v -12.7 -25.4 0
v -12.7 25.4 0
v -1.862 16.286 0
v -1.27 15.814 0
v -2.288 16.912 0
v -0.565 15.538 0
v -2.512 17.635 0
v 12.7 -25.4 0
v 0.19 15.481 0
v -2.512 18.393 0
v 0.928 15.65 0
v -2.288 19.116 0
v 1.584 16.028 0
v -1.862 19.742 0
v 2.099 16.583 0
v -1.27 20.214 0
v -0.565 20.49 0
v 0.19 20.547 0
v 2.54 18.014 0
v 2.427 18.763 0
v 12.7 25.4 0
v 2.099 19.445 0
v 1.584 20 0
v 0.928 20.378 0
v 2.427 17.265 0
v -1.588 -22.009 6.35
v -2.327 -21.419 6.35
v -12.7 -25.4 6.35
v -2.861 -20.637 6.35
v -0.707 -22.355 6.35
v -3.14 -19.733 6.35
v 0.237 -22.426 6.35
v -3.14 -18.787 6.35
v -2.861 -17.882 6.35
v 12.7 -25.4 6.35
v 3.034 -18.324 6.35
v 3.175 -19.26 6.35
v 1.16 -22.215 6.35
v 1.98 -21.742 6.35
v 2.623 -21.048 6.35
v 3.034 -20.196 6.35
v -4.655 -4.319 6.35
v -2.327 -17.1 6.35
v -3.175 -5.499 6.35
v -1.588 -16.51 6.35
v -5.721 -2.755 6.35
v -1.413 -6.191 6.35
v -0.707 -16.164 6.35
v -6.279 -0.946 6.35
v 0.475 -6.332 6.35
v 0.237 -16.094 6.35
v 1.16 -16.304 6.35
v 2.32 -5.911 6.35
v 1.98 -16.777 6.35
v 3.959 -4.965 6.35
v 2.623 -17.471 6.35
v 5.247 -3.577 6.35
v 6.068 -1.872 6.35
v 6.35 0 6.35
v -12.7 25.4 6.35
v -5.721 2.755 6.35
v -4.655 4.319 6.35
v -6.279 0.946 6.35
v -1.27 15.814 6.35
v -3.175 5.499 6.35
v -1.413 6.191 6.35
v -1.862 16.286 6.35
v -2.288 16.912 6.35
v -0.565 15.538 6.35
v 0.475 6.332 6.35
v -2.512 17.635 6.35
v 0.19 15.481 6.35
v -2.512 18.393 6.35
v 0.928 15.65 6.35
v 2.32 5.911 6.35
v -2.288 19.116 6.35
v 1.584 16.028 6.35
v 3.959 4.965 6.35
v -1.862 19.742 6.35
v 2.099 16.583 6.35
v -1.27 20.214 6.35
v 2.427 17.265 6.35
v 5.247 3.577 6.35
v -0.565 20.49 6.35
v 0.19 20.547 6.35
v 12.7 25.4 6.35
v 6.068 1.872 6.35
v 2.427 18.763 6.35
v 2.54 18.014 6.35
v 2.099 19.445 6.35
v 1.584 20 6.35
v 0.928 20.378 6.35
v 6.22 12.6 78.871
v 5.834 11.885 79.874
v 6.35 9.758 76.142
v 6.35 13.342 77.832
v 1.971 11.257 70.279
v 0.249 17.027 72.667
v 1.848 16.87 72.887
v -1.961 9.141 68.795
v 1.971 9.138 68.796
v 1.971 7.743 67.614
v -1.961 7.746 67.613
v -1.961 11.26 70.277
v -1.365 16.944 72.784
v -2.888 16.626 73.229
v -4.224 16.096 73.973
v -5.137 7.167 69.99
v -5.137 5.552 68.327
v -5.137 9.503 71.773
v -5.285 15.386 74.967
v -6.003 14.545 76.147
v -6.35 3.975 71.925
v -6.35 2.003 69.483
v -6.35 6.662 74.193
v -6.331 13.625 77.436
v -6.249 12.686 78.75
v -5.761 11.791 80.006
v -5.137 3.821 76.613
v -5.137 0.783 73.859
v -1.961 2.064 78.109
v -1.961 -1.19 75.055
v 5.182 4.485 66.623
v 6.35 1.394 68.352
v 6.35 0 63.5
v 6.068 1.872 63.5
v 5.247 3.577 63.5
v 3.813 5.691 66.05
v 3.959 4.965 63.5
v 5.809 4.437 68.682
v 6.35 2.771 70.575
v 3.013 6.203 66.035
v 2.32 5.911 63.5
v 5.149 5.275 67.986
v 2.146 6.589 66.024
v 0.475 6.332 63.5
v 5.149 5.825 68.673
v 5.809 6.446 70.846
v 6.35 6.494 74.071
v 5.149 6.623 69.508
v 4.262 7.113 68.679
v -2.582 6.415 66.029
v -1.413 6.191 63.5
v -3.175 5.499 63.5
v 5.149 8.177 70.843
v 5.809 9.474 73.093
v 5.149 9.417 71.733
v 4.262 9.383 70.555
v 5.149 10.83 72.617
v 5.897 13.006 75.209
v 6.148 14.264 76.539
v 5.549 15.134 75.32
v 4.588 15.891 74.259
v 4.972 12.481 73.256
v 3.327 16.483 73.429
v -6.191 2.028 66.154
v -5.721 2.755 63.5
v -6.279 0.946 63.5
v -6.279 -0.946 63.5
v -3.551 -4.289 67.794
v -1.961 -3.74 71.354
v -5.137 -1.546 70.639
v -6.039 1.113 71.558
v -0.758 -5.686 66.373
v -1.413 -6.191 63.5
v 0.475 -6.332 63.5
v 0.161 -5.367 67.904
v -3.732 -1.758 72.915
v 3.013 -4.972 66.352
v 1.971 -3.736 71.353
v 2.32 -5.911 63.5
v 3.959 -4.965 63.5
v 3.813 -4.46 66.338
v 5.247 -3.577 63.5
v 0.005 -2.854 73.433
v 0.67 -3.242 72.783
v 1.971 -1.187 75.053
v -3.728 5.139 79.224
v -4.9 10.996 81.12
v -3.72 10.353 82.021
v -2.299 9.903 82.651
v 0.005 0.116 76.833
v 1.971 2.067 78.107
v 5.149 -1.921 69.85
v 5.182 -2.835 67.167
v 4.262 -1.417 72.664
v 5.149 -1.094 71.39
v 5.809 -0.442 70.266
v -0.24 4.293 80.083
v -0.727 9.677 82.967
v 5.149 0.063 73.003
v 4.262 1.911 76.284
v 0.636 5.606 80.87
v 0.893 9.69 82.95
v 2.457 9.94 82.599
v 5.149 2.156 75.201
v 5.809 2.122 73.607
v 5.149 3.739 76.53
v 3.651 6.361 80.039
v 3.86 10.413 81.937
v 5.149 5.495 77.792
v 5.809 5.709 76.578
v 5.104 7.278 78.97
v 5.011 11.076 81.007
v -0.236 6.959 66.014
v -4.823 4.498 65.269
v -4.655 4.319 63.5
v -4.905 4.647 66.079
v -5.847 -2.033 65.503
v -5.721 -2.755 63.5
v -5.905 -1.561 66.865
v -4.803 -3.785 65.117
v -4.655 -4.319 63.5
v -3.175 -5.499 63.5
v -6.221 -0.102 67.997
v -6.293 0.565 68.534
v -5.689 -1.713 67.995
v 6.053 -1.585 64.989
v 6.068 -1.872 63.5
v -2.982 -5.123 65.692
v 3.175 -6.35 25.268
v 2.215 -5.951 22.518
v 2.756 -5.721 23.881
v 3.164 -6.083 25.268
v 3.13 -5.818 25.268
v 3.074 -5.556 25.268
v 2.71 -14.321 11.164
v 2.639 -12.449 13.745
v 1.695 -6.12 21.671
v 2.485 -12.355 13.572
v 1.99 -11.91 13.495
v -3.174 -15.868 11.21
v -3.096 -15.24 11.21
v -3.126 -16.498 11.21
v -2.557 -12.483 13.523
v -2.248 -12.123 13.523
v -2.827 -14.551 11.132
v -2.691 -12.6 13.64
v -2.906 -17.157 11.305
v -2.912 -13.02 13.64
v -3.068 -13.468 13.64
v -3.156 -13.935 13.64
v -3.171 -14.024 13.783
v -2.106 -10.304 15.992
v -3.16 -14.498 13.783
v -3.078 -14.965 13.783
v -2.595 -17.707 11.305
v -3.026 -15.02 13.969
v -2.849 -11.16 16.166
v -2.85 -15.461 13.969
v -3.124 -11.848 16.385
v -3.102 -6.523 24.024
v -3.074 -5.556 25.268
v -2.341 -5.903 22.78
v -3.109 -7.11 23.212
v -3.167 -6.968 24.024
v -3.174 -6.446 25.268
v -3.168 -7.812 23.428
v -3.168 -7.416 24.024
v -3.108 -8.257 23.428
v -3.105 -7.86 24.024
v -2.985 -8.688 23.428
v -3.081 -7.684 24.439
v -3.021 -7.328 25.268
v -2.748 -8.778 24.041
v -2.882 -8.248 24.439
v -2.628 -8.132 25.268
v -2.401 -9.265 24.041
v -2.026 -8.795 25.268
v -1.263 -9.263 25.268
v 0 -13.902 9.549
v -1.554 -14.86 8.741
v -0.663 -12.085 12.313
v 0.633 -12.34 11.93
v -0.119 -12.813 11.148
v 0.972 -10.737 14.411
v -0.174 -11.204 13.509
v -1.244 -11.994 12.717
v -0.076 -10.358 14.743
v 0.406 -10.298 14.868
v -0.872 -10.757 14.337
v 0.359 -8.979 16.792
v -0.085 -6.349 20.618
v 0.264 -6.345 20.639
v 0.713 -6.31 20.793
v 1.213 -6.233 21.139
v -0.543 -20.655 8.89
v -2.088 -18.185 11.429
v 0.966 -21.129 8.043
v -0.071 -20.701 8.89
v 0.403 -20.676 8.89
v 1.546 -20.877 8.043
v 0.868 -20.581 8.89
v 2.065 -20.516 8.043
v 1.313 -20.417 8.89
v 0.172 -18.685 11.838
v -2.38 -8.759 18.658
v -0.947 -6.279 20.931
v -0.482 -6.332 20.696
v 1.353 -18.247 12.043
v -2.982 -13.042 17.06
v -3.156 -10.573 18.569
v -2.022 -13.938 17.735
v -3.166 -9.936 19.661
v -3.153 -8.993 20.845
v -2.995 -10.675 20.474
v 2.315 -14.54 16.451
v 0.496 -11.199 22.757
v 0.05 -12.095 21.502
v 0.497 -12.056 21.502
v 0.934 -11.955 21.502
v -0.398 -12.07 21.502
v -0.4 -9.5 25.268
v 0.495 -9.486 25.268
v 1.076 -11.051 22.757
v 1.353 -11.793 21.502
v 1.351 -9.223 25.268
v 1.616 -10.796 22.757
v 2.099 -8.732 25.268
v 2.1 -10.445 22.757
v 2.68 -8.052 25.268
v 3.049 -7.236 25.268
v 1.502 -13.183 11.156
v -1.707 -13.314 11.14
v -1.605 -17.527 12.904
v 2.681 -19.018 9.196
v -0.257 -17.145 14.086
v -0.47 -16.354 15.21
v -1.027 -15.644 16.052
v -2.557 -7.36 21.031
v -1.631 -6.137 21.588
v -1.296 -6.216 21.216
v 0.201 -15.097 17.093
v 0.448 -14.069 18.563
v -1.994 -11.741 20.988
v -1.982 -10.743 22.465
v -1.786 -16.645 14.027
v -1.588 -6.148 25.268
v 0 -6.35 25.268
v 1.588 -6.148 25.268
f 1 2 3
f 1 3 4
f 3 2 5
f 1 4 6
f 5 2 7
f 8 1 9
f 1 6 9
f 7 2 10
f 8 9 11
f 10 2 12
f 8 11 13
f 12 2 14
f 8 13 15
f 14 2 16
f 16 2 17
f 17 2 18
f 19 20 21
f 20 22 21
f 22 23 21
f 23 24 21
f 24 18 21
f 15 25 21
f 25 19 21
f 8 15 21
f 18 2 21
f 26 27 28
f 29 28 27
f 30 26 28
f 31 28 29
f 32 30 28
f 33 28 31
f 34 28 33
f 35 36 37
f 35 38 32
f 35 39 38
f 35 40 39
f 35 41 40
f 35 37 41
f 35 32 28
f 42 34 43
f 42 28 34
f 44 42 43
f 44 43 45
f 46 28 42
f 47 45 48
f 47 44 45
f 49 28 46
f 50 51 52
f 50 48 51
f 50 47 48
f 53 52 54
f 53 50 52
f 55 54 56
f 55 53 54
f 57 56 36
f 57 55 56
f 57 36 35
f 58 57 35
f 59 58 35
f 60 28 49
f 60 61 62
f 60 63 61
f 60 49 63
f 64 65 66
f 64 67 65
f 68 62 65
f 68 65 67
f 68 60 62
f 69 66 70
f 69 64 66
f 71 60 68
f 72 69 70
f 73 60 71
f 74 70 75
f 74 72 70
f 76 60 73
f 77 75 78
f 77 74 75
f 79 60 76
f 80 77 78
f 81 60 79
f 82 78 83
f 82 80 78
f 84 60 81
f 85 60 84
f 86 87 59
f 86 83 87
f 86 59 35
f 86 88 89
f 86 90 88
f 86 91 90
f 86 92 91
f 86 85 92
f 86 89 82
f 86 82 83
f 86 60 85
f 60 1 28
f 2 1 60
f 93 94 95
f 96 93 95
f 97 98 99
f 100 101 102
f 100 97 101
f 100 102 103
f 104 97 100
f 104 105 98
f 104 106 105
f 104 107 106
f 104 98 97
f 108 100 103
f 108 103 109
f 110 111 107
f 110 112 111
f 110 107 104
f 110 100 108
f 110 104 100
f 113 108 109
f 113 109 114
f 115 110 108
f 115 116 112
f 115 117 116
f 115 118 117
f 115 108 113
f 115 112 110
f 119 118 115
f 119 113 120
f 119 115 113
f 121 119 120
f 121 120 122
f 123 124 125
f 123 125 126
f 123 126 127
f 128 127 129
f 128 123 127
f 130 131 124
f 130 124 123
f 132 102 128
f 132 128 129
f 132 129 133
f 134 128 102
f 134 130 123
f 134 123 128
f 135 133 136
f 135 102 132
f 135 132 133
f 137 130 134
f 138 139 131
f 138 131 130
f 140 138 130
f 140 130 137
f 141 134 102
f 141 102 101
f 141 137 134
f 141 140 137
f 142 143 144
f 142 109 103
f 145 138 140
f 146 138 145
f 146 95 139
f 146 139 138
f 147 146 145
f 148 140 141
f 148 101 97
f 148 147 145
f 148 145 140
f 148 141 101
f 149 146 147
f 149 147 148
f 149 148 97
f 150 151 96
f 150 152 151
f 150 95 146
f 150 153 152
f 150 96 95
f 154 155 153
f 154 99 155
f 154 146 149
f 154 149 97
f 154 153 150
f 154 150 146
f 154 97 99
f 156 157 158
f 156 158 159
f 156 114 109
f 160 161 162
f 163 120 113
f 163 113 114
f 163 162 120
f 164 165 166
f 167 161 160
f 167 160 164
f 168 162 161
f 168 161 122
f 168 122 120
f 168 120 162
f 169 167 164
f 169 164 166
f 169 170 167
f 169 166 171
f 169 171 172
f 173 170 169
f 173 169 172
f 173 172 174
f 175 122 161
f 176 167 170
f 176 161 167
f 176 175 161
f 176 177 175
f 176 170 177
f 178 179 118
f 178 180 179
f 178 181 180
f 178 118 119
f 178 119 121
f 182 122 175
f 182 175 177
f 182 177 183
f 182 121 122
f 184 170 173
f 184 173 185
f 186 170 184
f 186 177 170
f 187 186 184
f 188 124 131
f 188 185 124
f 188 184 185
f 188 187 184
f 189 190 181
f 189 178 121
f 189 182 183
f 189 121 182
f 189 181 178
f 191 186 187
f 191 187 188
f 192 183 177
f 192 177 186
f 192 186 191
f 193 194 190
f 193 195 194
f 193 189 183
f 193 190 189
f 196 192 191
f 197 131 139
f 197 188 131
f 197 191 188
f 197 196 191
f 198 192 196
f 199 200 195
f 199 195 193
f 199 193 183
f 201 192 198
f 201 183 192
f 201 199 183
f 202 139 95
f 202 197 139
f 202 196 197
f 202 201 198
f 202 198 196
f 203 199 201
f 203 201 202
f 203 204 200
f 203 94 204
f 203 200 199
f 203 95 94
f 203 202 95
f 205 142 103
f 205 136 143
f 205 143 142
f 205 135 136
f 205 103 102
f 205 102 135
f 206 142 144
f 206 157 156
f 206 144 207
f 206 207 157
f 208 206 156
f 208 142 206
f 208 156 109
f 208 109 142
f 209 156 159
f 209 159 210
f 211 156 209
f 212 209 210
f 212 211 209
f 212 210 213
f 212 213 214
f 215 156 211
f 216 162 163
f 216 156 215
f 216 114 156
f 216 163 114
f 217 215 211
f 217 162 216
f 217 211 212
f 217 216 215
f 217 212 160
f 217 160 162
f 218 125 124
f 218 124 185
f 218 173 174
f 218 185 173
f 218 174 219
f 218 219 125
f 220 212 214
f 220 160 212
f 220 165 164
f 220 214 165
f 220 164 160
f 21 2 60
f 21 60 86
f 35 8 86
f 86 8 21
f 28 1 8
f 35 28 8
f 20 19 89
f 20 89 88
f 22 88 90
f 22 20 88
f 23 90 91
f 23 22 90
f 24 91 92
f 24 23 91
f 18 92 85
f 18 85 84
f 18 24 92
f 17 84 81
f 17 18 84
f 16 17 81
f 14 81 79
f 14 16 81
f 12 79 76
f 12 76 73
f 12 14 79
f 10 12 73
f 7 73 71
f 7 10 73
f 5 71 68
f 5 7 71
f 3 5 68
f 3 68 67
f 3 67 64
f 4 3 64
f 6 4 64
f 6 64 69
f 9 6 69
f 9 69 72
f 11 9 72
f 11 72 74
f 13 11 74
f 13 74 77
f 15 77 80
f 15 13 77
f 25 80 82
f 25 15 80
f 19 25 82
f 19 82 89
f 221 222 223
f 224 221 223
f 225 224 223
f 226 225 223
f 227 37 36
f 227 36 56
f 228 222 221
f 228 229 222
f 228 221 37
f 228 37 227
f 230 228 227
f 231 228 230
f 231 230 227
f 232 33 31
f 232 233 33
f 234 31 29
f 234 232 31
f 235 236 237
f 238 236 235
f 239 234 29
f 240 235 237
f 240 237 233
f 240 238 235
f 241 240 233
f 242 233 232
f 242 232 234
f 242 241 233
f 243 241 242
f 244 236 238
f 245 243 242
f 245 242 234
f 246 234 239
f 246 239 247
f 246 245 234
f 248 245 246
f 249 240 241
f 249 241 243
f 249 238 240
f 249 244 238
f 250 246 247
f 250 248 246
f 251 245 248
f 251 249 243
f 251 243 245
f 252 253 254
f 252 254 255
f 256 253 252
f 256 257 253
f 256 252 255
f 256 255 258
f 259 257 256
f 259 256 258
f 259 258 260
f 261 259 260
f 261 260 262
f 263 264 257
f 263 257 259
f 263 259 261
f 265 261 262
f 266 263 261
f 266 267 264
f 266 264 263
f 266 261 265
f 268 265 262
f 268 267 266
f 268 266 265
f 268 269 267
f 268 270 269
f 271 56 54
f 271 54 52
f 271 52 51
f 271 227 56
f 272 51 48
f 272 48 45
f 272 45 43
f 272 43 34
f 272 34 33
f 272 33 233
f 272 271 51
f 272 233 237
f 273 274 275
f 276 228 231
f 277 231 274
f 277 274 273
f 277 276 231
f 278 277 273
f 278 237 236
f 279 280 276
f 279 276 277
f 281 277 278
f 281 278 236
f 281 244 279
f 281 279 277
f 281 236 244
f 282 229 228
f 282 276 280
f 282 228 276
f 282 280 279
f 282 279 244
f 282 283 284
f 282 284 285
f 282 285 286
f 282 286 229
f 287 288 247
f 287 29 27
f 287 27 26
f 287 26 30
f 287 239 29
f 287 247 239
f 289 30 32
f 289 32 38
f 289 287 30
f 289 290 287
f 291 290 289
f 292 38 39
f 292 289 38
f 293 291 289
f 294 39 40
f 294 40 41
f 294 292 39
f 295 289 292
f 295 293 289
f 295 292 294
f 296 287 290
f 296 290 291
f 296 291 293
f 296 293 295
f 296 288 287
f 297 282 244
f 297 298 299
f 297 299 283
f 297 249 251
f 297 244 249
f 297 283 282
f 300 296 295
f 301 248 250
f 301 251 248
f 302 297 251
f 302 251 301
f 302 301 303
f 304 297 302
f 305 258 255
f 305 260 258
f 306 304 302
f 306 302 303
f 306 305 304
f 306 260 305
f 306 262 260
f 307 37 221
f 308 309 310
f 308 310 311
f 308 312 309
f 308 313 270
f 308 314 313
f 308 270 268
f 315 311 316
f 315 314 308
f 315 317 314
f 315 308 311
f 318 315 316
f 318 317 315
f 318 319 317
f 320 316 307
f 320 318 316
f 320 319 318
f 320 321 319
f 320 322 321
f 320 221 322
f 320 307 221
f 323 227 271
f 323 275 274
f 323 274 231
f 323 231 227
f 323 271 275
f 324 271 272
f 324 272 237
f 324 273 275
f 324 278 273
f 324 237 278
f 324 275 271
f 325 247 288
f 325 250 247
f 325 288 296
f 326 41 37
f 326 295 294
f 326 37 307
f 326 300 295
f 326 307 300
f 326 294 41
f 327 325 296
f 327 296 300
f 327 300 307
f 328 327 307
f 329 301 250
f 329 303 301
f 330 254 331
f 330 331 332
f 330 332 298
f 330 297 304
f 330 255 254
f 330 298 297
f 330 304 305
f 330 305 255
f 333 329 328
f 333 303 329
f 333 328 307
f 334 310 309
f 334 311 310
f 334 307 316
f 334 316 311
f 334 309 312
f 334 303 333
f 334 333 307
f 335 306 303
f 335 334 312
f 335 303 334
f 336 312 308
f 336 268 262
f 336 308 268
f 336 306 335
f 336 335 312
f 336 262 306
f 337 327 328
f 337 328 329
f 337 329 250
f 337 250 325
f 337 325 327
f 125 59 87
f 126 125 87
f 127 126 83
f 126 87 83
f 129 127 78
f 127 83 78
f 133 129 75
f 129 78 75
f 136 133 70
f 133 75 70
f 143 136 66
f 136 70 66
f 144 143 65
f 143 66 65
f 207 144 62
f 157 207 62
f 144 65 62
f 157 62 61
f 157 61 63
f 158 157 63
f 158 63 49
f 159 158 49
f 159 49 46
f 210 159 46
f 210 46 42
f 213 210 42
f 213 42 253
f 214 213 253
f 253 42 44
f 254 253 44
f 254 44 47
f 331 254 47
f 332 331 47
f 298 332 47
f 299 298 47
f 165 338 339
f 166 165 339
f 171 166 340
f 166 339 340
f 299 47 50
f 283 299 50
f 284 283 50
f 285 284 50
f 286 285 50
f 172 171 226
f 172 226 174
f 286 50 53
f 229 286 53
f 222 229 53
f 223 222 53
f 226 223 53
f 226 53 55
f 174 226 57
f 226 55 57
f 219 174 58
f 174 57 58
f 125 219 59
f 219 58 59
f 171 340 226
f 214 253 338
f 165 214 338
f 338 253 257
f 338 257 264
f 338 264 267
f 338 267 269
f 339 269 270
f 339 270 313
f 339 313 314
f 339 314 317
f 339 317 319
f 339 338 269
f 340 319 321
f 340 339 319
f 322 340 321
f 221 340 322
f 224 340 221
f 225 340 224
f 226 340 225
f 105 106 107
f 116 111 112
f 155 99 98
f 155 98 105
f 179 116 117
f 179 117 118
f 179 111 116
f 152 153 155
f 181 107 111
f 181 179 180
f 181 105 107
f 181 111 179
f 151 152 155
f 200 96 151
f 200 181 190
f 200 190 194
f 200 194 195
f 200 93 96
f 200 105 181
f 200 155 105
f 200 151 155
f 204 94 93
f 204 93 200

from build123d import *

# Parameters (mm, degrees)
F0_W      = 25.4
F0_H      = 50.8
F0_R      = 3.175
F0_R_2    = 6.35
F0_R_3    = 2.54
F1_DEPTH  = 6.35
F2_DEPTH  = 63.5
F4_DEPTH  = 6.35
F2_FACE_R = 6.35
F6_R      = 3.175


with BuildPart() as f1:
    # F0 (on Top) → F1 (new body)
    with BuildSketch(Plane.XY):
        Rectangle(F0_W, F0_H)
        with Locations((0, -19.2597191781)):
            Circle(F0_R, mode=Mode.SUBTRACT)
        Circle(F0_R_2, mode=Mode.SUBTRACT)
        with Locations((0, 18.014030531)):
            Circle(F0_R_3, mode=Mode.SUBTRACT)
    extrude(amount=F1_DEPTH)

    # F0 (on Top) → F2 (join)
    with BuildSketch(Plane.XY):
        Circle(F0_R_2)
    extrude(amount=F2_DEPTH)

    # F0 (on Top) → F4 (join, through all)
    with BuildSketch(Plane.XY):
        with Locations((0, -19.2597191781)):
            Circle(F0_R)
    extrude(amount=F4_DEPTH)

    # F5: sweep along a path in F3
    with BuildLine(Plane.YZ) as f5_path:
        add(Plane.YZ * Edge.make_bspline(
            [(0, 63.5), (0.3497077138, 64.9335091592), (1.0344697619, 70.7236922928), (8.5873221979, 75.9309157729), (13.3415265009, 77.8324604034)],
            knots=[0, 0, 0, 0, 0.400987996, 1, 1, 1, 1], degree=3))
    # F2_face (on face) → F5 (sweep)
    with BuildSketch(Plane.XY.offset(63.5)):
        Circle(F2_FACE_R)
    sweep(path=f5_path.line)

    # F7: sweep along a path in F3
    with BuildLine(Plane.YZ) as f7_path:
        Line((-19.2597191781, 6.35), (-6.35, 25.267848745))
    # F6 (on face) → F7 (sweep)
    with BuildSketch(Plane.XY.offset(6.35)):
        with Locations((0, -19.2597191781)):
            Circle(F6_R)
    sweep(path=f7_path.line)


solid = f1.part
